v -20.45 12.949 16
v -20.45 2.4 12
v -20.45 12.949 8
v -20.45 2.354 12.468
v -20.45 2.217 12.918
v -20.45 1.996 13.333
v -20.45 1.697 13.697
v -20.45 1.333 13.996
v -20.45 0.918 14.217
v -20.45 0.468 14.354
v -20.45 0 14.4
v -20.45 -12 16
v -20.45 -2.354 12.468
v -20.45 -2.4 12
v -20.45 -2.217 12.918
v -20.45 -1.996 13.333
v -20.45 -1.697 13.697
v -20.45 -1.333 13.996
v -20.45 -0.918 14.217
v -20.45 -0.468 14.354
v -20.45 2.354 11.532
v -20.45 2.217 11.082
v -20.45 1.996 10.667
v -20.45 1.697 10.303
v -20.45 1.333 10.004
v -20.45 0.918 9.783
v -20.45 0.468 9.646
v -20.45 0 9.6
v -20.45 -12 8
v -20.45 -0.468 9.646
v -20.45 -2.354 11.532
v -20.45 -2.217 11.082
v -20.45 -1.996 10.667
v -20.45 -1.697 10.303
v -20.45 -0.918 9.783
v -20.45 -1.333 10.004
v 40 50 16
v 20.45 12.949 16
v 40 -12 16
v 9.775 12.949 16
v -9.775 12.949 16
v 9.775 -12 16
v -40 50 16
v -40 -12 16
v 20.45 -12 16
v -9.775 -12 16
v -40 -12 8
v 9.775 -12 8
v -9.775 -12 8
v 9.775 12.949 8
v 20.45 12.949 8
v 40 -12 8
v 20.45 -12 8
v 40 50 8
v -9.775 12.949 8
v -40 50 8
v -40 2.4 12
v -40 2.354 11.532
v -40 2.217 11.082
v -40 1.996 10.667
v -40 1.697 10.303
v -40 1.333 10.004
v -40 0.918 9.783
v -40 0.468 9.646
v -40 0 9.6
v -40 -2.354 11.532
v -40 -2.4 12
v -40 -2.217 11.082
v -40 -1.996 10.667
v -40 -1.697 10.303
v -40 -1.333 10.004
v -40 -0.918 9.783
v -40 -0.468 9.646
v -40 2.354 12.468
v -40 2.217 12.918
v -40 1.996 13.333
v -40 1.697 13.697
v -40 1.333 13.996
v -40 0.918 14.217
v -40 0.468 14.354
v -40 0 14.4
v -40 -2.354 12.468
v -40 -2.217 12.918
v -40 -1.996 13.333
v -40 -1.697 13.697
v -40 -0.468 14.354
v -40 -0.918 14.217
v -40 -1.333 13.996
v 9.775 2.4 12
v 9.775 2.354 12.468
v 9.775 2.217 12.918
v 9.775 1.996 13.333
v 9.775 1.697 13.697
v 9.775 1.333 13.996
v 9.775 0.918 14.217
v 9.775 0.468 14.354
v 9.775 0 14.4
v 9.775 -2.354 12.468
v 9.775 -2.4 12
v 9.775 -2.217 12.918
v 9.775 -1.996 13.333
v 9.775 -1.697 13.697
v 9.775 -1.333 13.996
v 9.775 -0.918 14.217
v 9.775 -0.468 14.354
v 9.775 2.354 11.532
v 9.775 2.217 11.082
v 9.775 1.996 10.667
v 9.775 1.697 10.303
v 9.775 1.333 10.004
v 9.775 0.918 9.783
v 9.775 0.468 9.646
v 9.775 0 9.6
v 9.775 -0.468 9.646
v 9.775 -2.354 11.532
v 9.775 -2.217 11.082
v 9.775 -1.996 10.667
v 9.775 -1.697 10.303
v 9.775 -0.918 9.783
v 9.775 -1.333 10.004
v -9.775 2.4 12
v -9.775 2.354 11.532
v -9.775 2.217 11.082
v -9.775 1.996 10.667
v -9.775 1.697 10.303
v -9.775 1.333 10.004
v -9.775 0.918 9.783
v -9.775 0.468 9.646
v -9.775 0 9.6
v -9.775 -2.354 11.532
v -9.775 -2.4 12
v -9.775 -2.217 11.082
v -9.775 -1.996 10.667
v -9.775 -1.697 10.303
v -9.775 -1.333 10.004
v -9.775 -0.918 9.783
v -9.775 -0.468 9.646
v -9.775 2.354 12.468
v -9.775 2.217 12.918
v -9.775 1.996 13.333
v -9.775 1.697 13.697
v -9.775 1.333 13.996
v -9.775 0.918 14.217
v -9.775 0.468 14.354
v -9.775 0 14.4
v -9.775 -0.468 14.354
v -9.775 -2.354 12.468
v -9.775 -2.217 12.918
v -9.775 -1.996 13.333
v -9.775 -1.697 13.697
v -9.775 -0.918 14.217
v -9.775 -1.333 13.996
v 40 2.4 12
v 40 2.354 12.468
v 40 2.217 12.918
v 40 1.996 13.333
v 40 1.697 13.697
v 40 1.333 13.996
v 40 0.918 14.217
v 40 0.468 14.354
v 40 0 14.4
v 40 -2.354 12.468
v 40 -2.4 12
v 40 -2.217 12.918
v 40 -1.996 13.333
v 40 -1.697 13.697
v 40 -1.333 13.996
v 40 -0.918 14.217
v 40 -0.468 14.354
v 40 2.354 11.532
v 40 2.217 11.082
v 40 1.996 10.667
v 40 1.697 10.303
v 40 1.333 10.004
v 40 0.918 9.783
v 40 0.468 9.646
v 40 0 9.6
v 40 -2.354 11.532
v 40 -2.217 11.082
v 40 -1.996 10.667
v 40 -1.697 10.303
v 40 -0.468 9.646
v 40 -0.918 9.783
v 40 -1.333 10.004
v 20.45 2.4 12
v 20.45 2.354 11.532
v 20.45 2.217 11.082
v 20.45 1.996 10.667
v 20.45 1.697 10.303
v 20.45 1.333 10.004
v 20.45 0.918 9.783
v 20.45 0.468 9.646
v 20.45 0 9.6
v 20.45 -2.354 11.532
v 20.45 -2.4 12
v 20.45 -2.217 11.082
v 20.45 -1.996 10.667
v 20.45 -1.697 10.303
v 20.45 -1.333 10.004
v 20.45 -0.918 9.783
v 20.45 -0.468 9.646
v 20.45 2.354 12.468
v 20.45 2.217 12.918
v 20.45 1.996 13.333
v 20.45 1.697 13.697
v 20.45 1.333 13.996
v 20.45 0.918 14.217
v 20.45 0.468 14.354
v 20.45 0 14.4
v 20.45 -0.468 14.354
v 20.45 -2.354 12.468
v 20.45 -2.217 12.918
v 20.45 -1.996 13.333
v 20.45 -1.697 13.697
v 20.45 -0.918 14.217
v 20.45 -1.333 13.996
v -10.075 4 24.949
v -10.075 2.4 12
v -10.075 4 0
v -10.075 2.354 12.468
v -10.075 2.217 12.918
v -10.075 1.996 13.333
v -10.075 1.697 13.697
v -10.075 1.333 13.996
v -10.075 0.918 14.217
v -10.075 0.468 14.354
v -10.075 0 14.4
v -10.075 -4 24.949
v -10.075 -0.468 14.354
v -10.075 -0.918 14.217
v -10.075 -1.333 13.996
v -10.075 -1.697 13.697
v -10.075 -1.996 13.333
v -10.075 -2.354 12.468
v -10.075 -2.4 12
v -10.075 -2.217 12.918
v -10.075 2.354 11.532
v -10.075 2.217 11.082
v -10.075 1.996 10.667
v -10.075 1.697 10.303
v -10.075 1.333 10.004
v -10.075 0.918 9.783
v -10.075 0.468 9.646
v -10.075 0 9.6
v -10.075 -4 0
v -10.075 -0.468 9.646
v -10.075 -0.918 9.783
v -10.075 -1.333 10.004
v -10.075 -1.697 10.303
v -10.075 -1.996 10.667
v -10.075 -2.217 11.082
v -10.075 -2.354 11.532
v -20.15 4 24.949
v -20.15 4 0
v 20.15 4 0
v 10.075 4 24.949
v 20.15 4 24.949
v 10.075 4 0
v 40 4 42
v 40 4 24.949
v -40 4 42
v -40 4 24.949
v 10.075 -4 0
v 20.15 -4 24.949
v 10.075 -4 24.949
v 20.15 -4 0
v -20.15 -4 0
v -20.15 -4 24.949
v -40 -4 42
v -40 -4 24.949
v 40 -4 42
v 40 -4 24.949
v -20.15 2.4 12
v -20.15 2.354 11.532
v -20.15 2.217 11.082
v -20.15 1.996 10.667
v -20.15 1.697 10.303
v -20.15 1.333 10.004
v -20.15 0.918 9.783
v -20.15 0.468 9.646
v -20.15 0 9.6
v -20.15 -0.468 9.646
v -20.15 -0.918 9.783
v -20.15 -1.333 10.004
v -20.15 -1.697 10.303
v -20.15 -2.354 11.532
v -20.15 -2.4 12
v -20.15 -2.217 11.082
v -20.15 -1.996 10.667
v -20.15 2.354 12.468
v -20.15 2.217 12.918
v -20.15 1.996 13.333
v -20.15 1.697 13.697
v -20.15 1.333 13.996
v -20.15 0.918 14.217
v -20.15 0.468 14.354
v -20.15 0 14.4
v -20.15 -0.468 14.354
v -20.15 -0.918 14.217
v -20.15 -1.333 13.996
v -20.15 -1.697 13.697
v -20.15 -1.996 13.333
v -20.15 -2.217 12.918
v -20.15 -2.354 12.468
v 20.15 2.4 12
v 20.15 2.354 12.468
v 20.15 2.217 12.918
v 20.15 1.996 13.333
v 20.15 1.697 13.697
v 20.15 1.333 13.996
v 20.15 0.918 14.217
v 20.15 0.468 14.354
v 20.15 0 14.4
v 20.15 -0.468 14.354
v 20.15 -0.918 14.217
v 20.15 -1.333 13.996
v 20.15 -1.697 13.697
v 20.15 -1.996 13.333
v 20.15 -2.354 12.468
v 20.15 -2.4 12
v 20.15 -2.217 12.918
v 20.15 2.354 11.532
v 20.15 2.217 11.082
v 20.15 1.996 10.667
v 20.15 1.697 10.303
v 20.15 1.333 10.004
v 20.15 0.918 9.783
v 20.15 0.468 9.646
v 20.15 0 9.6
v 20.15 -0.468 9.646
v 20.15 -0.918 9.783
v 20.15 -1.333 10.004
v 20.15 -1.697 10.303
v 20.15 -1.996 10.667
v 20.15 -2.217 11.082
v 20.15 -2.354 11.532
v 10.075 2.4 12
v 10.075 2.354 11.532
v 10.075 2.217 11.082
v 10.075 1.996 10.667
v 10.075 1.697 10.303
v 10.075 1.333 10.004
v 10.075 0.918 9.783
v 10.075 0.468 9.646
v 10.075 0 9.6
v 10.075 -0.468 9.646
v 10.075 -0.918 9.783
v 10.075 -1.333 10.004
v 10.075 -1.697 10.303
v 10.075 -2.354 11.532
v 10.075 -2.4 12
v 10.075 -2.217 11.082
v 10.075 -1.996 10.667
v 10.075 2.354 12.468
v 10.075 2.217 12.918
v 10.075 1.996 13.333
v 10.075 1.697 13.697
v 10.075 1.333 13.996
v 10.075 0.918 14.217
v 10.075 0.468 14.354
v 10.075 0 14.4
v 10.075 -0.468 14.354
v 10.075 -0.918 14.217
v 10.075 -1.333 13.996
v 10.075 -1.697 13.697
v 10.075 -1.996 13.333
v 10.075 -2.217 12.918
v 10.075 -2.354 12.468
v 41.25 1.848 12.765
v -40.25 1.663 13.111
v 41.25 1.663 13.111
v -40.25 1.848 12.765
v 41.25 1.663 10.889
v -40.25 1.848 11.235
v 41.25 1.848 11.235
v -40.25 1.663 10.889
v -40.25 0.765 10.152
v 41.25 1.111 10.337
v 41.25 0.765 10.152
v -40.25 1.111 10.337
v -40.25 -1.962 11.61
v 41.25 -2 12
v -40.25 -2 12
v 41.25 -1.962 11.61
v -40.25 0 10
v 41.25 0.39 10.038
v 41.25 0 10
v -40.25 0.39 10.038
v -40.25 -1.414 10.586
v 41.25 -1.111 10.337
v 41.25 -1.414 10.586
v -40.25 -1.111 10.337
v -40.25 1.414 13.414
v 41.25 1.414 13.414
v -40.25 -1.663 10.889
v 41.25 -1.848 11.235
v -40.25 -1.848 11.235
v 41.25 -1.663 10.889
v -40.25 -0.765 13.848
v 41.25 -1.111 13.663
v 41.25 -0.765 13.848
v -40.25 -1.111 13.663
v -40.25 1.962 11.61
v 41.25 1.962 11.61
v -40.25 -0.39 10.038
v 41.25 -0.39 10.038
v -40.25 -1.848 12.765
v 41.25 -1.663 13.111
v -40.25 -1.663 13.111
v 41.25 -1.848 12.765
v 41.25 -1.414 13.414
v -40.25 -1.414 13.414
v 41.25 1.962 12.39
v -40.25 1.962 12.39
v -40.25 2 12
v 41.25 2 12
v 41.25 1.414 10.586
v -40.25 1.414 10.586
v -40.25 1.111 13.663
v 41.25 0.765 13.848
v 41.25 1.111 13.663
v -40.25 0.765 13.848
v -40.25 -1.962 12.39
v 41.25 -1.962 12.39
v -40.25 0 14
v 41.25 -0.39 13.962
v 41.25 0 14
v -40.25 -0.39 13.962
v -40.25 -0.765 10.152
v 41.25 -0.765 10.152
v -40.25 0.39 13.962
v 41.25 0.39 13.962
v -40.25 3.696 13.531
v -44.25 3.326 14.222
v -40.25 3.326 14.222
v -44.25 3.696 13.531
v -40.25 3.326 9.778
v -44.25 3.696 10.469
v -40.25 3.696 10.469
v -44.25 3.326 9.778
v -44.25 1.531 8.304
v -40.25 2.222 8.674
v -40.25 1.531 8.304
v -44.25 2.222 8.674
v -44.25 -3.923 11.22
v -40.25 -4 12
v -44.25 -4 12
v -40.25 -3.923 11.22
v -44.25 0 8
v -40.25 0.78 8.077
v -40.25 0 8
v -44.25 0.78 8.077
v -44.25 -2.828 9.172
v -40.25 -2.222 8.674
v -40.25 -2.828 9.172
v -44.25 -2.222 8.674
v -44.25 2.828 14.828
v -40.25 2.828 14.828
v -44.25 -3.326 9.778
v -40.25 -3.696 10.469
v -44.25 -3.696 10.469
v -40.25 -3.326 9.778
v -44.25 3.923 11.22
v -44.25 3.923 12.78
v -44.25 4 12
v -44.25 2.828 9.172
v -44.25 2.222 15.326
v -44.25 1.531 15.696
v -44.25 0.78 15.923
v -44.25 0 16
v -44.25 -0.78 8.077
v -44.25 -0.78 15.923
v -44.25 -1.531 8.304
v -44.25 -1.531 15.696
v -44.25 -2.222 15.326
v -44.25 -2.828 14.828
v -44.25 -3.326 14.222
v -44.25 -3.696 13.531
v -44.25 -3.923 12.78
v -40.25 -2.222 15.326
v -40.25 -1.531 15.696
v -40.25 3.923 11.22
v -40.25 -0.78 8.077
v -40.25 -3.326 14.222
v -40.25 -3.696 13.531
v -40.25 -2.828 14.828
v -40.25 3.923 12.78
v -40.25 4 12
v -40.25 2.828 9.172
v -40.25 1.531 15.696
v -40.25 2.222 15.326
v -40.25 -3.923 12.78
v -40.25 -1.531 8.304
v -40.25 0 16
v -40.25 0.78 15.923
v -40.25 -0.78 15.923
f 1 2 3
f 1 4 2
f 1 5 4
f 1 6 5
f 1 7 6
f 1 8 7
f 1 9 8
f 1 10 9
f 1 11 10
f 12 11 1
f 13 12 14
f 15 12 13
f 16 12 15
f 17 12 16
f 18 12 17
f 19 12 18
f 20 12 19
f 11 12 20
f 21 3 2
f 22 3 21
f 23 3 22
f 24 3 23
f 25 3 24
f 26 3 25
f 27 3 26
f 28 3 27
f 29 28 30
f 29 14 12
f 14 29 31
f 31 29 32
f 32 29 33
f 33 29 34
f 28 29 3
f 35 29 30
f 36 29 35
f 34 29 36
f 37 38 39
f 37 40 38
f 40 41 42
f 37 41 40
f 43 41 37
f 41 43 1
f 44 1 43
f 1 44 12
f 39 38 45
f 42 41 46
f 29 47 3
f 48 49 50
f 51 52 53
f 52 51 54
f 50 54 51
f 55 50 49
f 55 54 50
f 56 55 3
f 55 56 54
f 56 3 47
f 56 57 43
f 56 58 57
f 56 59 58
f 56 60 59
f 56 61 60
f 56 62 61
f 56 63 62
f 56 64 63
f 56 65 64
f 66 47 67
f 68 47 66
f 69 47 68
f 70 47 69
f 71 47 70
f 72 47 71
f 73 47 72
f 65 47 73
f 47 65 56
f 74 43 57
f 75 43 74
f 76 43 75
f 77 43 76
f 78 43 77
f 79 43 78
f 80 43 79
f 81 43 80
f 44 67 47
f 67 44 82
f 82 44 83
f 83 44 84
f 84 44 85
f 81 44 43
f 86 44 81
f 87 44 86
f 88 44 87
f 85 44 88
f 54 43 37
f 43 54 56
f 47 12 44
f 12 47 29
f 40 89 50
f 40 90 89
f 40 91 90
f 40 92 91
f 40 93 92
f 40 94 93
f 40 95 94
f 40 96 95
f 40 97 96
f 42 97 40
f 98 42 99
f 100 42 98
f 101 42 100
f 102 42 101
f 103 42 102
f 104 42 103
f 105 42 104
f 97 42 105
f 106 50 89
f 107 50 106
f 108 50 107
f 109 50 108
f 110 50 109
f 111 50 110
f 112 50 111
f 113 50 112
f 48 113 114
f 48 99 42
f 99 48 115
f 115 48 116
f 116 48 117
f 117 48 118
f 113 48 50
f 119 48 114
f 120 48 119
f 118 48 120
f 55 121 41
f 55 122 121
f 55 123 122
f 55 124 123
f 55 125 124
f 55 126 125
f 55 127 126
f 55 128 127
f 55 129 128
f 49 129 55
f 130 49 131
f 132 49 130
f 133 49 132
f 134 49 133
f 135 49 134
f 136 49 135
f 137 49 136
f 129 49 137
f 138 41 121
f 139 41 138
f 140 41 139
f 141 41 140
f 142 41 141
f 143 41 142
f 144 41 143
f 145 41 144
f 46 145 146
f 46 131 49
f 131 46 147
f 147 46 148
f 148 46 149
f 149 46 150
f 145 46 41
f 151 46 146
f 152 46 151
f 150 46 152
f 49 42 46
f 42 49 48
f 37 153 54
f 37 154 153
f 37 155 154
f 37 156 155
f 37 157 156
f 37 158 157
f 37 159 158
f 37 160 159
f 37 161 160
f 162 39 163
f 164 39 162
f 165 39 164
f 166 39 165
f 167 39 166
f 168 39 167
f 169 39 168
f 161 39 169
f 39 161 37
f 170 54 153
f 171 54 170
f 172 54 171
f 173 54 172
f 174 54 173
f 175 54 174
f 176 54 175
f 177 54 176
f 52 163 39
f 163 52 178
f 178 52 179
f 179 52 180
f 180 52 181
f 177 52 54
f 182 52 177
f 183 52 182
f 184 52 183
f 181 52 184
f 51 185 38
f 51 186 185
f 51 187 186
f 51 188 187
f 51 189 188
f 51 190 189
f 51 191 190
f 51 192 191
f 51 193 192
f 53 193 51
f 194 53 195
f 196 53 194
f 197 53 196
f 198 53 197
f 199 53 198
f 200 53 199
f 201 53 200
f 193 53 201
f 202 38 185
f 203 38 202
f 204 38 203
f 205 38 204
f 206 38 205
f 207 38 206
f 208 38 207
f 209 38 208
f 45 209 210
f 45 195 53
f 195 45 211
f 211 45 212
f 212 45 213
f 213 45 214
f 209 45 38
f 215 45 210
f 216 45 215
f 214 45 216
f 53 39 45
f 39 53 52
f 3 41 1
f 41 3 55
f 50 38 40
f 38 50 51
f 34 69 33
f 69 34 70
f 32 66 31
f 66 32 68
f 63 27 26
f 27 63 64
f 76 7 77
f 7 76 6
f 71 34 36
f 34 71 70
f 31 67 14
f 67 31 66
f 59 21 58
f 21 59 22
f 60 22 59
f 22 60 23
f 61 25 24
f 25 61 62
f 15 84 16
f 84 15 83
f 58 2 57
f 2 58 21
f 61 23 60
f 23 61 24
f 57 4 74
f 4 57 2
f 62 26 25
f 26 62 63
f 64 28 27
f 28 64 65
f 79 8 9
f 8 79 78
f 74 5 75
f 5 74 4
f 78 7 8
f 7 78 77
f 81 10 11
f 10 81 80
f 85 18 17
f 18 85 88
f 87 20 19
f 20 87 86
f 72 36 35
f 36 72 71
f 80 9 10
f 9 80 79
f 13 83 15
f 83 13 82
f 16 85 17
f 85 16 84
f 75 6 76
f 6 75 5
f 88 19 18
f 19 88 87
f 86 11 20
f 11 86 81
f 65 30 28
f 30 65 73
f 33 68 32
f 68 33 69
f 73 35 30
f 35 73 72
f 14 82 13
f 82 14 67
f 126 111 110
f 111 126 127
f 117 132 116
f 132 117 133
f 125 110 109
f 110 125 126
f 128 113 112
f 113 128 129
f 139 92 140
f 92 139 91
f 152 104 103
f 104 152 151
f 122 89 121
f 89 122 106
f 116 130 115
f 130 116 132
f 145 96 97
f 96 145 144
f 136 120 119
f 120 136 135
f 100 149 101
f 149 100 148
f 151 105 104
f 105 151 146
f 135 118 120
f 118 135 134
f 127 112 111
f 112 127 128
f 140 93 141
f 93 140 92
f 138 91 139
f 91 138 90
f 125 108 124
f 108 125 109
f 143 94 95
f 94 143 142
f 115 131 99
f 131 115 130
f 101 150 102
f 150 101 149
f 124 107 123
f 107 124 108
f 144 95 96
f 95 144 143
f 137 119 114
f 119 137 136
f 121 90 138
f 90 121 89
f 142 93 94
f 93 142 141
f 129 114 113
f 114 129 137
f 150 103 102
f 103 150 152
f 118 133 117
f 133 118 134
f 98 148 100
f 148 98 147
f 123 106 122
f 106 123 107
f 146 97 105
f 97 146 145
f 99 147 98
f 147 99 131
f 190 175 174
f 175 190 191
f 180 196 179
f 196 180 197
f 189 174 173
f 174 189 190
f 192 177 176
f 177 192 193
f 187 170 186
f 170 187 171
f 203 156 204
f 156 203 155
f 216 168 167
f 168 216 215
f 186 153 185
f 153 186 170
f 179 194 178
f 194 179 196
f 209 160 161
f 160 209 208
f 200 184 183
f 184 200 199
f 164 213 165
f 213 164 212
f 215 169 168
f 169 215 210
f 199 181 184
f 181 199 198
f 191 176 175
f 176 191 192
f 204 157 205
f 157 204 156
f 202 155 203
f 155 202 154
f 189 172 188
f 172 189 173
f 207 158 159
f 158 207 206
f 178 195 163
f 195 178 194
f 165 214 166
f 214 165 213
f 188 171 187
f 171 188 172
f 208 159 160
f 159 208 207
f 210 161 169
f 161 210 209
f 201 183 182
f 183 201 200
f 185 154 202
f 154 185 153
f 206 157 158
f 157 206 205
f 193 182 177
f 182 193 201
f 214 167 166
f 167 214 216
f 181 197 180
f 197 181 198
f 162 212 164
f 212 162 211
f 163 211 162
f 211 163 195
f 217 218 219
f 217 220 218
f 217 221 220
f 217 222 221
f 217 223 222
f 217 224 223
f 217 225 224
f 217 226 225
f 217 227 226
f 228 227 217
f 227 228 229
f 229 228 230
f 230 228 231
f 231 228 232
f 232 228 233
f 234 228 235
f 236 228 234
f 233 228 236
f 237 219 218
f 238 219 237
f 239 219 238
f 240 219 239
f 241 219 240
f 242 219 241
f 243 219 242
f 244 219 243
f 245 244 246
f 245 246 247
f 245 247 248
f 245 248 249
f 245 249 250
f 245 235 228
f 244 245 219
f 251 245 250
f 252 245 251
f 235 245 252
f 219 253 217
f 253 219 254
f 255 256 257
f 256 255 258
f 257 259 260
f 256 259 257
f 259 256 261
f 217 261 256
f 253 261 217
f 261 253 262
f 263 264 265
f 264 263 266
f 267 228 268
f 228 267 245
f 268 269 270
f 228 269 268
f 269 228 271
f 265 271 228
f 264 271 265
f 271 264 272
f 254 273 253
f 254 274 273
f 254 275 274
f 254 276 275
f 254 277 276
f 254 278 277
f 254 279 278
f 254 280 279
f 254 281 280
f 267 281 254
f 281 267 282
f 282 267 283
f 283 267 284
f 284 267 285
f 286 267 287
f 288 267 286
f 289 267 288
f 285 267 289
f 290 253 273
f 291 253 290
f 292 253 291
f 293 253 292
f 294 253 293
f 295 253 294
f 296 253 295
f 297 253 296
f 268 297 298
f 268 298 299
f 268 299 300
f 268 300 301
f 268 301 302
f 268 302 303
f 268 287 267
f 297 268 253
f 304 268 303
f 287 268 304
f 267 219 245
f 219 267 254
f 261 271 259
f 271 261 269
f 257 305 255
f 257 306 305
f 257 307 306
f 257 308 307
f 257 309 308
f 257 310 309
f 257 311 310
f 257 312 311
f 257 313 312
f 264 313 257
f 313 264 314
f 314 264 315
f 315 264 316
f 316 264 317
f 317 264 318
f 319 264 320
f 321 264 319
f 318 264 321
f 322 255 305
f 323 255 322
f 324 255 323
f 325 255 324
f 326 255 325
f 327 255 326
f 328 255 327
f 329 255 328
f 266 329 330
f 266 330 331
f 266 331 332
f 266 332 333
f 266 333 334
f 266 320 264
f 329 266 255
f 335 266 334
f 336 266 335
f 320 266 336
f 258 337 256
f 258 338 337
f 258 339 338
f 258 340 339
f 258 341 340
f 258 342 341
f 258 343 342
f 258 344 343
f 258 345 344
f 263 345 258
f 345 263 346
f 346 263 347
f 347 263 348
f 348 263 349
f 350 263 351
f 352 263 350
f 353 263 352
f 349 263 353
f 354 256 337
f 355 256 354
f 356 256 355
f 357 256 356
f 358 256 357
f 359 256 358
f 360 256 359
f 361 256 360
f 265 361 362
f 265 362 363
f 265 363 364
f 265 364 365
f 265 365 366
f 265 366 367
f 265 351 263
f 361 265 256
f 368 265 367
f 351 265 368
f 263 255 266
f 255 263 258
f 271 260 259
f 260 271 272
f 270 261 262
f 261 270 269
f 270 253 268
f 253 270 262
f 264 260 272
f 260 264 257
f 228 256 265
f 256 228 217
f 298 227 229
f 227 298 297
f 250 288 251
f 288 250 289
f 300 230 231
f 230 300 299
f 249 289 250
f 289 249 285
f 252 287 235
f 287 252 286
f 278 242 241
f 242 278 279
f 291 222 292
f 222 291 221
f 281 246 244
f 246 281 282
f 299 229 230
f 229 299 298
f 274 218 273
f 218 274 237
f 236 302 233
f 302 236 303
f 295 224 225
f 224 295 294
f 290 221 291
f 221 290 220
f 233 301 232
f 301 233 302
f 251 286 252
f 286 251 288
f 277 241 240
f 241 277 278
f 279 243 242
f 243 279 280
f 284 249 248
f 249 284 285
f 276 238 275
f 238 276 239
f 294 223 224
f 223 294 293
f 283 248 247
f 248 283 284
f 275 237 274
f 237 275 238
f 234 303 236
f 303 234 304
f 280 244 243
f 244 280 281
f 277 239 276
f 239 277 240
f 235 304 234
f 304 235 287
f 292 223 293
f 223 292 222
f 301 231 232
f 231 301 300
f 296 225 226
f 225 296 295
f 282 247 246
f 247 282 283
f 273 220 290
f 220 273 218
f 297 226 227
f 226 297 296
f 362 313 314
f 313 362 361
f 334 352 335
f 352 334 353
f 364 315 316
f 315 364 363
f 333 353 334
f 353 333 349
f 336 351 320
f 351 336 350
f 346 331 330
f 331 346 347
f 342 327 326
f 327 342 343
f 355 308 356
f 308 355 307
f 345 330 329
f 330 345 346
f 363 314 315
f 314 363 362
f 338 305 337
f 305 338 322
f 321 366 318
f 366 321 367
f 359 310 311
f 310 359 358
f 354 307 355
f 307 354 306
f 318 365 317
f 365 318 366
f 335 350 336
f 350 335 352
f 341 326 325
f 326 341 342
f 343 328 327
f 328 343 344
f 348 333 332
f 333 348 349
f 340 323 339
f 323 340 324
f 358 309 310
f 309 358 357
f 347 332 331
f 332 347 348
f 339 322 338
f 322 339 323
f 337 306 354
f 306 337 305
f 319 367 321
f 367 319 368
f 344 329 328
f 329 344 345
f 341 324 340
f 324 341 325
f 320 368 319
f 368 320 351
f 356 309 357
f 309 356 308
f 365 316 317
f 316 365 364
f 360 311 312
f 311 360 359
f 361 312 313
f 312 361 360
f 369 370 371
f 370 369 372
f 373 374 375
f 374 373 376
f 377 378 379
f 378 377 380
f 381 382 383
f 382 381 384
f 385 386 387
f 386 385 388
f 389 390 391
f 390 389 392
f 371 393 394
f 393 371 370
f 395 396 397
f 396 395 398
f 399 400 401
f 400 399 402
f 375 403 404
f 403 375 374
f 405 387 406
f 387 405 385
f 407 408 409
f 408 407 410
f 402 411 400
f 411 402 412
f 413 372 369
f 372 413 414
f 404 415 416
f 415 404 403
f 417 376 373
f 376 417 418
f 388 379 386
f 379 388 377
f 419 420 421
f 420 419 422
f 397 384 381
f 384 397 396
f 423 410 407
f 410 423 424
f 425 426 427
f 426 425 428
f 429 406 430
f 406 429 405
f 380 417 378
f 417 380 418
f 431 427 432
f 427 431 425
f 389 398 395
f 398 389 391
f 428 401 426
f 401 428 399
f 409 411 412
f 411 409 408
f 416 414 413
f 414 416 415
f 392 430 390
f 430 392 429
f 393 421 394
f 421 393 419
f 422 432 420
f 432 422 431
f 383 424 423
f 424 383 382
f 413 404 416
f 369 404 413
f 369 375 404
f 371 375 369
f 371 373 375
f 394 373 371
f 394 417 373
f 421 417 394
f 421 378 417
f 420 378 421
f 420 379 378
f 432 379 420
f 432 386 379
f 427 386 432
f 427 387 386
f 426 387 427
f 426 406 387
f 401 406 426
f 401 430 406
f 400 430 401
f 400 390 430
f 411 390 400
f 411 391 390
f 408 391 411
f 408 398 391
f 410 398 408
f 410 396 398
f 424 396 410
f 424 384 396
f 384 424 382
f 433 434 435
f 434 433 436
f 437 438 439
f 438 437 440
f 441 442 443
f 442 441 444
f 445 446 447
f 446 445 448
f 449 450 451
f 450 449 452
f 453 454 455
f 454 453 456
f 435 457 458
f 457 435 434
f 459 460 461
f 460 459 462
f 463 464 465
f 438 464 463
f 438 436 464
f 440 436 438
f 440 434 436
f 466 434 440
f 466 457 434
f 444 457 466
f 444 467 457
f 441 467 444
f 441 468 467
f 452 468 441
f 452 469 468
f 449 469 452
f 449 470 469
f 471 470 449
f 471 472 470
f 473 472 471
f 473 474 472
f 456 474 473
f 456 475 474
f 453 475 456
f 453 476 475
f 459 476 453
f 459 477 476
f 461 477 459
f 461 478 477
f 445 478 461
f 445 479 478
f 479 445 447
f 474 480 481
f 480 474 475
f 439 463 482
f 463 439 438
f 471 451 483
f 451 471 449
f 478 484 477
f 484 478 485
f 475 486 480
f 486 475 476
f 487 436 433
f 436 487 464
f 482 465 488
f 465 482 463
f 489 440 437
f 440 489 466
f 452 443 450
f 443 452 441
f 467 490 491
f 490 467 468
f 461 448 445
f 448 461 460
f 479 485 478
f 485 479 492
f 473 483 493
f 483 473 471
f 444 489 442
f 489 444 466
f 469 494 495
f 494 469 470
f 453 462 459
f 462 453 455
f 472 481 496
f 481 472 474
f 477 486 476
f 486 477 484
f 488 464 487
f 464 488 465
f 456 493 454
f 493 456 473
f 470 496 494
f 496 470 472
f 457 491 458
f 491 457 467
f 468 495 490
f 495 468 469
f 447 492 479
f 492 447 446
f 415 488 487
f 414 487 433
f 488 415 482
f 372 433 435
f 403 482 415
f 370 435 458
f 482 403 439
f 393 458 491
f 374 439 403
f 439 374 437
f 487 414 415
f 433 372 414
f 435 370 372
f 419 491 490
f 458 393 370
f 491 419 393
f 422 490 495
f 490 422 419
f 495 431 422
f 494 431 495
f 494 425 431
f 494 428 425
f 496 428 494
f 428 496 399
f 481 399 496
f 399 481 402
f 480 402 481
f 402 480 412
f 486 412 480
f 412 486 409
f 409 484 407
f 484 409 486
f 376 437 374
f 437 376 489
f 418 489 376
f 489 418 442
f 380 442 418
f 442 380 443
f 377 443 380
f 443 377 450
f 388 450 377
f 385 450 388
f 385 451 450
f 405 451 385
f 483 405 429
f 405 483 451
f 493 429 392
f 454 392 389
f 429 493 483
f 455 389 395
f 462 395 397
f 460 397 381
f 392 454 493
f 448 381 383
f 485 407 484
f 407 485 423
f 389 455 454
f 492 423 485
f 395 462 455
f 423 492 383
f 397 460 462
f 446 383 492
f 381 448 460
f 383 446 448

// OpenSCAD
$fn = 32;

// ------------------------------------------------------------------------
// Butt hinge: hinge 80 mm, leaf swung 270 deg
// Every part is its own module, assembly() places every instance.
// ------------------------------------------------------------------------

// --- part 1 ---
module hinge_base() {
  difference() {
    union() {
      translate([-40, -12, -4]) cube([19.55, 62, 8]);
      translate([-9.775, -12, -4]) cube([19.55, 62, 8]);
      translate([20.45, -12, -4]) cube([19.55, 62, 8]);
      translate([-40, 12.949, -4]) cube([80, 37.051, 8]);
    }
    translate([-30.225, 0, 0]) rotate([0, 90, 0]) cylinder(h = 21.55, d = 4.8, center = true);
    translate([0, 0, 0]) rotate([0, 90, 0]) cylinder(h = 21.55, d = 4.8, center = true);
    translate([30.225, 0, 0]) rotate([0, 90, 0]) cylinder(h = 21.55, d = 4.8, center = true);
  }
}

// --- part 2 ---
module hinge_mover() {
  difference() {
    union() {
      translate([-20.15, -30, -4]) cube([10.075, 42, 8]);
      translate([10.075, -30, -4]) cube([10.075, 42, 8]);
      translate([-40, -30, -4]) cube([80, 17.051, 8]);
    }
    translate([-15.113, 0, 0]) rotate([0, 90, 0]) cylinder(h = 12.075, d = 4.8, center = true);
    translate([15.113, 0, 0]) rotate([0, 90, 0]) cylinder(h = 12.075, d = 4.8, center = true);
  }
}

// --- part 3 ---
module hinge_pin() {
  rotate([0, 90, 0]) cylinder(h = 82.5, d = 4, center = true);
  translate([-44.25, 0, 0]) rotate([0, 90, 0]) cylinder(h = 4, d = 8);
}

// --- assembly ---
module assembly() {
  color([0.80, 0.24, 0.20]) translate([0, 0, 12]) rotate([0, 0, 0]) hinge_base();
  color([0.20, 0.45, 0.75]) translate([0, 0, 12]) rotate([270, 0, 0]) hinge_mover();
  color([0.25, 0.62, 0.32]) translate([0, 0, 12]) rotate([0, 0, 0]) hinge_pin();
}

assembly();
